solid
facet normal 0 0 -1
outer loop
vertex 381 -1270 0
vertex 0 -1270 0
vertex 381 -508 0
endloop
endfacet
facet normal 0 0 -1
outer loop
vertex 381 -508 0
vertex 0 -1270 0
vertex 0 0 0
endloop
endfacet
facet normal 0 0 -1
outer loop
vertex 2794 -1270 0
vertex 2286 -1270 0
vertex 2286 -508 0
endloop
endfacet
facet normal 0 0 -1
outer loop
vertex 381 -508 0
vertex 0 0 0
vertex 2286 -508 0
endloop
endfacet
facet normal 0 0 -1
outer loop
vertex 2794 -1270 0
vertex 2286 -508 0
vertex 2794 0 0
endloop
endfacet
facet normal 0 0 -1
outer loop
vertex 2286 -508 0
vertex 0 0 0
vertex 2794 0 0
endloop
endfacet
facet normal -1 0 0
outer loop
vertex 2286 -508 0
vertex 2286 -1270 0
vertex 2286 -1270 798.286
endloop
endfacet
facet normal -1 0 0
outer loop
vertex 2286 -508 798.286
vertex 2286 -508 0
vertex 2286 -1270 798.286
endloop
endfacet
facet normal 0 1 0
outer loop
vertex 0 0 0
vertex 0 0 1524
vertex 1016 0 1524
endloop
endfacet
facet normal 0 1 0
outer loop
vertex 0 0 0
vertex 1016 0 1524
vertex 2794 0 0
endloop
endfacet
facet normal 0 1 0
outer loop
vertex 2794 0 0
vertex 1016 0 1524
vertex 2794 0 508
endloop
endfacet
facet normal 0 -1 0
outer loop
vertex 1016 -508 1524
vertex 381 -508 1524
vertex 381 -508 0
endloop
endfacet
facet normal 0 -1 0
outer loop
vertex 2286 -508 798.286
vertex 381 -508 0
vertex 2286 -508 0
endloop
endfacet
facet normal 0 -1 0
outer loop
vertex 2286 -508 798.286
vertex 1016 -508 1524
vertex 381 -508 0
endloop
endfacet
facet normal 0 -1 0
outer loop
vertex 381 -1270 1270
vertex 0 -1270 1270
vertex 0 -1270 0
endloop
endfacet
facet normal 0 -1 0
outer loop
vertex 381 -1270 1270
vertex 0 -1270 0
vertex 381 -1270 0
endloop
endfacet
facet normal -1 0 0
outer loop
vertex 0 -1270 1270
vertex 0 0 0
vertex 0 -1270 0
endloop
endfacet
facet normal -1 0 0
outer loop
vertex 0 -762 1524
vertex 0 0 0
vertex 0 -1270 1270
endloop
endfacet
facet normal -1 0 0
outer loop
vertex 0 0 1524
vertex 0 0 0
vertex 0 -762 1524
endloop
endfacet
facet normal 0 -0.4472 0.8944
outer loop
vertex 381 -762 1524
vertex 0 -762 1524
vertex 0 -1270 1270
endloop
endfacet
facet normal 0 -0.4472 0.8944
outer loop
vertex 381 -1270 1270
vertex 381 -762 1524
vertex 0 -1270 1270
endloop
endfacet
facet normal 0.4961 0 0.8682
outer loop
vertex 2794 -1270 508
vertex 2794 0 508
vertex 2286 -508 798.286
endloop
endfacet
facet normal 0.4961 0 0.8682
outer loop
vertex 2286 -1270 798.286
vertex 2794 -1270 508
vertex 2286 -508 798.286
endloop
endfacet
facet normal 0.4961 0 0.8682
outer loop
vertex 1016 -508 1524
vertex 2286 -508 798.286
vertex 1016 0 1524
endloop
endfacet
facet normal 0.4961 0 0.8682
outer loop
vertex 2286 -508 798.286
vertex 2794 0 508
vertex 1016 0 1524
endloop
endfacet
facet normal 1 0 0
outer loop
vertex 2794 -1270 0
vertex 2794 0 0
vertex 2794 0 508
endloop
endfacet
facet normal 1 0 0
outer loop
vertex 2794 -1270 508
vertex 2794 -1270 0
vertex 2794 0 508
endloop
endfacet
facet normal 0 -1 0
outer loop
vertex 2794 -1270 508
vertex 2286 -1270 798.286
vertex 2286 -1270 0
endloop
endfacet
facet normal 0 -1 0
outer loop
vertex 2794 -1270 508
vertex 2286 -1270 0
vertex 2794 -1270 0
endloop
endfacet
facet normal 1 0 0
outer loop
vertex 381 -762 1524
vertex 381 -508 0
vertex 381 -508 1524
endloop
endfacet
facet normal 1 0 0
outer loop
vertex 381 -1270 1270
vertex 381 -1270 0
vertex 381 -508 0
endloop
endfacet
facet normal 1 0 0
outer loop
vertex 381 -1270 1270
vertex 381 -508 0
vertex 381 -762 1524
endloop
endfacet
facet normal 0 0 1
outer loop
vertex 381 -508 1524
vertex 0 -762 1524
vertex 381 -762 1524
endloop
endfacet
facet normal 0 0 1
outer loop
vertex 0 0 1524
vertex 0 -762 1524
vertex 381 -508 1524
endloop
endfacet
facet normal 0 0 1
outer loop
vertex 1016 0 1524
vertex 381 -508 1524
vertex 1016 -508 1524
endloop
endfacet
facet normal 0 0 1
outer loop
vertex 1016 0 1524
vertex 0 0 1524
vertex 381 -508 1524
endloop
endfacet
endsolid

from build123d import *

# Parameters (mm, degrees)
F0_W     = 2794
F0_H     = 1524
F1_DEPTH = 1270
F2_W     = 1905
F2_H     = 1524
F3_DEPTH = 762
F5_DEPTH = 381
F7_DEPTH = 1270


with BuildPart() as f1:
    # F0 (on Front) → F1 (new body)
    with BuildSketch(Plane.XZ):
        with Locations((1397, 762)):
            Rectangle(F0_W, F0_H)
    extrude(amount=F1_DEPTH)

    # F2 (on face) → F3 (cut)
    with BuildSketch(Plane.XZ.offset(1270)):
        with Locations((1333.5, 762)):
            Rectangle(F2_W, F2_H)
    extrude(amount=-F3_DEPTH, mode=Mode.SUBTRACT)

    # F4 (on face) → F5 (cut)
    with BuildSketch(Plane(origin=(0, 0, 0), x_dir=(0, -1, 0), z_dir=(-1, 0, 0))):
        Polygon((1270, 1524), (762, 1524), (1270, 1270), align=None)
    extrude(amount=-F5_DEPTH, mode=Mode.SUBTRACT)

    # F6 (on face) → F7 (cut)
    with BuildSketch(Plane(origin=(0, 0, 0), x_dir=(-1, 0, 0), z_dir=(0, 1, 0))):
        Polygon((-2794, 508), (-1016, 1524), (-2794, 1524), align=None)
    extrude(amount=-F7_DEPTH, mode=Mode.SUBTRACT)


solid = f1.part
